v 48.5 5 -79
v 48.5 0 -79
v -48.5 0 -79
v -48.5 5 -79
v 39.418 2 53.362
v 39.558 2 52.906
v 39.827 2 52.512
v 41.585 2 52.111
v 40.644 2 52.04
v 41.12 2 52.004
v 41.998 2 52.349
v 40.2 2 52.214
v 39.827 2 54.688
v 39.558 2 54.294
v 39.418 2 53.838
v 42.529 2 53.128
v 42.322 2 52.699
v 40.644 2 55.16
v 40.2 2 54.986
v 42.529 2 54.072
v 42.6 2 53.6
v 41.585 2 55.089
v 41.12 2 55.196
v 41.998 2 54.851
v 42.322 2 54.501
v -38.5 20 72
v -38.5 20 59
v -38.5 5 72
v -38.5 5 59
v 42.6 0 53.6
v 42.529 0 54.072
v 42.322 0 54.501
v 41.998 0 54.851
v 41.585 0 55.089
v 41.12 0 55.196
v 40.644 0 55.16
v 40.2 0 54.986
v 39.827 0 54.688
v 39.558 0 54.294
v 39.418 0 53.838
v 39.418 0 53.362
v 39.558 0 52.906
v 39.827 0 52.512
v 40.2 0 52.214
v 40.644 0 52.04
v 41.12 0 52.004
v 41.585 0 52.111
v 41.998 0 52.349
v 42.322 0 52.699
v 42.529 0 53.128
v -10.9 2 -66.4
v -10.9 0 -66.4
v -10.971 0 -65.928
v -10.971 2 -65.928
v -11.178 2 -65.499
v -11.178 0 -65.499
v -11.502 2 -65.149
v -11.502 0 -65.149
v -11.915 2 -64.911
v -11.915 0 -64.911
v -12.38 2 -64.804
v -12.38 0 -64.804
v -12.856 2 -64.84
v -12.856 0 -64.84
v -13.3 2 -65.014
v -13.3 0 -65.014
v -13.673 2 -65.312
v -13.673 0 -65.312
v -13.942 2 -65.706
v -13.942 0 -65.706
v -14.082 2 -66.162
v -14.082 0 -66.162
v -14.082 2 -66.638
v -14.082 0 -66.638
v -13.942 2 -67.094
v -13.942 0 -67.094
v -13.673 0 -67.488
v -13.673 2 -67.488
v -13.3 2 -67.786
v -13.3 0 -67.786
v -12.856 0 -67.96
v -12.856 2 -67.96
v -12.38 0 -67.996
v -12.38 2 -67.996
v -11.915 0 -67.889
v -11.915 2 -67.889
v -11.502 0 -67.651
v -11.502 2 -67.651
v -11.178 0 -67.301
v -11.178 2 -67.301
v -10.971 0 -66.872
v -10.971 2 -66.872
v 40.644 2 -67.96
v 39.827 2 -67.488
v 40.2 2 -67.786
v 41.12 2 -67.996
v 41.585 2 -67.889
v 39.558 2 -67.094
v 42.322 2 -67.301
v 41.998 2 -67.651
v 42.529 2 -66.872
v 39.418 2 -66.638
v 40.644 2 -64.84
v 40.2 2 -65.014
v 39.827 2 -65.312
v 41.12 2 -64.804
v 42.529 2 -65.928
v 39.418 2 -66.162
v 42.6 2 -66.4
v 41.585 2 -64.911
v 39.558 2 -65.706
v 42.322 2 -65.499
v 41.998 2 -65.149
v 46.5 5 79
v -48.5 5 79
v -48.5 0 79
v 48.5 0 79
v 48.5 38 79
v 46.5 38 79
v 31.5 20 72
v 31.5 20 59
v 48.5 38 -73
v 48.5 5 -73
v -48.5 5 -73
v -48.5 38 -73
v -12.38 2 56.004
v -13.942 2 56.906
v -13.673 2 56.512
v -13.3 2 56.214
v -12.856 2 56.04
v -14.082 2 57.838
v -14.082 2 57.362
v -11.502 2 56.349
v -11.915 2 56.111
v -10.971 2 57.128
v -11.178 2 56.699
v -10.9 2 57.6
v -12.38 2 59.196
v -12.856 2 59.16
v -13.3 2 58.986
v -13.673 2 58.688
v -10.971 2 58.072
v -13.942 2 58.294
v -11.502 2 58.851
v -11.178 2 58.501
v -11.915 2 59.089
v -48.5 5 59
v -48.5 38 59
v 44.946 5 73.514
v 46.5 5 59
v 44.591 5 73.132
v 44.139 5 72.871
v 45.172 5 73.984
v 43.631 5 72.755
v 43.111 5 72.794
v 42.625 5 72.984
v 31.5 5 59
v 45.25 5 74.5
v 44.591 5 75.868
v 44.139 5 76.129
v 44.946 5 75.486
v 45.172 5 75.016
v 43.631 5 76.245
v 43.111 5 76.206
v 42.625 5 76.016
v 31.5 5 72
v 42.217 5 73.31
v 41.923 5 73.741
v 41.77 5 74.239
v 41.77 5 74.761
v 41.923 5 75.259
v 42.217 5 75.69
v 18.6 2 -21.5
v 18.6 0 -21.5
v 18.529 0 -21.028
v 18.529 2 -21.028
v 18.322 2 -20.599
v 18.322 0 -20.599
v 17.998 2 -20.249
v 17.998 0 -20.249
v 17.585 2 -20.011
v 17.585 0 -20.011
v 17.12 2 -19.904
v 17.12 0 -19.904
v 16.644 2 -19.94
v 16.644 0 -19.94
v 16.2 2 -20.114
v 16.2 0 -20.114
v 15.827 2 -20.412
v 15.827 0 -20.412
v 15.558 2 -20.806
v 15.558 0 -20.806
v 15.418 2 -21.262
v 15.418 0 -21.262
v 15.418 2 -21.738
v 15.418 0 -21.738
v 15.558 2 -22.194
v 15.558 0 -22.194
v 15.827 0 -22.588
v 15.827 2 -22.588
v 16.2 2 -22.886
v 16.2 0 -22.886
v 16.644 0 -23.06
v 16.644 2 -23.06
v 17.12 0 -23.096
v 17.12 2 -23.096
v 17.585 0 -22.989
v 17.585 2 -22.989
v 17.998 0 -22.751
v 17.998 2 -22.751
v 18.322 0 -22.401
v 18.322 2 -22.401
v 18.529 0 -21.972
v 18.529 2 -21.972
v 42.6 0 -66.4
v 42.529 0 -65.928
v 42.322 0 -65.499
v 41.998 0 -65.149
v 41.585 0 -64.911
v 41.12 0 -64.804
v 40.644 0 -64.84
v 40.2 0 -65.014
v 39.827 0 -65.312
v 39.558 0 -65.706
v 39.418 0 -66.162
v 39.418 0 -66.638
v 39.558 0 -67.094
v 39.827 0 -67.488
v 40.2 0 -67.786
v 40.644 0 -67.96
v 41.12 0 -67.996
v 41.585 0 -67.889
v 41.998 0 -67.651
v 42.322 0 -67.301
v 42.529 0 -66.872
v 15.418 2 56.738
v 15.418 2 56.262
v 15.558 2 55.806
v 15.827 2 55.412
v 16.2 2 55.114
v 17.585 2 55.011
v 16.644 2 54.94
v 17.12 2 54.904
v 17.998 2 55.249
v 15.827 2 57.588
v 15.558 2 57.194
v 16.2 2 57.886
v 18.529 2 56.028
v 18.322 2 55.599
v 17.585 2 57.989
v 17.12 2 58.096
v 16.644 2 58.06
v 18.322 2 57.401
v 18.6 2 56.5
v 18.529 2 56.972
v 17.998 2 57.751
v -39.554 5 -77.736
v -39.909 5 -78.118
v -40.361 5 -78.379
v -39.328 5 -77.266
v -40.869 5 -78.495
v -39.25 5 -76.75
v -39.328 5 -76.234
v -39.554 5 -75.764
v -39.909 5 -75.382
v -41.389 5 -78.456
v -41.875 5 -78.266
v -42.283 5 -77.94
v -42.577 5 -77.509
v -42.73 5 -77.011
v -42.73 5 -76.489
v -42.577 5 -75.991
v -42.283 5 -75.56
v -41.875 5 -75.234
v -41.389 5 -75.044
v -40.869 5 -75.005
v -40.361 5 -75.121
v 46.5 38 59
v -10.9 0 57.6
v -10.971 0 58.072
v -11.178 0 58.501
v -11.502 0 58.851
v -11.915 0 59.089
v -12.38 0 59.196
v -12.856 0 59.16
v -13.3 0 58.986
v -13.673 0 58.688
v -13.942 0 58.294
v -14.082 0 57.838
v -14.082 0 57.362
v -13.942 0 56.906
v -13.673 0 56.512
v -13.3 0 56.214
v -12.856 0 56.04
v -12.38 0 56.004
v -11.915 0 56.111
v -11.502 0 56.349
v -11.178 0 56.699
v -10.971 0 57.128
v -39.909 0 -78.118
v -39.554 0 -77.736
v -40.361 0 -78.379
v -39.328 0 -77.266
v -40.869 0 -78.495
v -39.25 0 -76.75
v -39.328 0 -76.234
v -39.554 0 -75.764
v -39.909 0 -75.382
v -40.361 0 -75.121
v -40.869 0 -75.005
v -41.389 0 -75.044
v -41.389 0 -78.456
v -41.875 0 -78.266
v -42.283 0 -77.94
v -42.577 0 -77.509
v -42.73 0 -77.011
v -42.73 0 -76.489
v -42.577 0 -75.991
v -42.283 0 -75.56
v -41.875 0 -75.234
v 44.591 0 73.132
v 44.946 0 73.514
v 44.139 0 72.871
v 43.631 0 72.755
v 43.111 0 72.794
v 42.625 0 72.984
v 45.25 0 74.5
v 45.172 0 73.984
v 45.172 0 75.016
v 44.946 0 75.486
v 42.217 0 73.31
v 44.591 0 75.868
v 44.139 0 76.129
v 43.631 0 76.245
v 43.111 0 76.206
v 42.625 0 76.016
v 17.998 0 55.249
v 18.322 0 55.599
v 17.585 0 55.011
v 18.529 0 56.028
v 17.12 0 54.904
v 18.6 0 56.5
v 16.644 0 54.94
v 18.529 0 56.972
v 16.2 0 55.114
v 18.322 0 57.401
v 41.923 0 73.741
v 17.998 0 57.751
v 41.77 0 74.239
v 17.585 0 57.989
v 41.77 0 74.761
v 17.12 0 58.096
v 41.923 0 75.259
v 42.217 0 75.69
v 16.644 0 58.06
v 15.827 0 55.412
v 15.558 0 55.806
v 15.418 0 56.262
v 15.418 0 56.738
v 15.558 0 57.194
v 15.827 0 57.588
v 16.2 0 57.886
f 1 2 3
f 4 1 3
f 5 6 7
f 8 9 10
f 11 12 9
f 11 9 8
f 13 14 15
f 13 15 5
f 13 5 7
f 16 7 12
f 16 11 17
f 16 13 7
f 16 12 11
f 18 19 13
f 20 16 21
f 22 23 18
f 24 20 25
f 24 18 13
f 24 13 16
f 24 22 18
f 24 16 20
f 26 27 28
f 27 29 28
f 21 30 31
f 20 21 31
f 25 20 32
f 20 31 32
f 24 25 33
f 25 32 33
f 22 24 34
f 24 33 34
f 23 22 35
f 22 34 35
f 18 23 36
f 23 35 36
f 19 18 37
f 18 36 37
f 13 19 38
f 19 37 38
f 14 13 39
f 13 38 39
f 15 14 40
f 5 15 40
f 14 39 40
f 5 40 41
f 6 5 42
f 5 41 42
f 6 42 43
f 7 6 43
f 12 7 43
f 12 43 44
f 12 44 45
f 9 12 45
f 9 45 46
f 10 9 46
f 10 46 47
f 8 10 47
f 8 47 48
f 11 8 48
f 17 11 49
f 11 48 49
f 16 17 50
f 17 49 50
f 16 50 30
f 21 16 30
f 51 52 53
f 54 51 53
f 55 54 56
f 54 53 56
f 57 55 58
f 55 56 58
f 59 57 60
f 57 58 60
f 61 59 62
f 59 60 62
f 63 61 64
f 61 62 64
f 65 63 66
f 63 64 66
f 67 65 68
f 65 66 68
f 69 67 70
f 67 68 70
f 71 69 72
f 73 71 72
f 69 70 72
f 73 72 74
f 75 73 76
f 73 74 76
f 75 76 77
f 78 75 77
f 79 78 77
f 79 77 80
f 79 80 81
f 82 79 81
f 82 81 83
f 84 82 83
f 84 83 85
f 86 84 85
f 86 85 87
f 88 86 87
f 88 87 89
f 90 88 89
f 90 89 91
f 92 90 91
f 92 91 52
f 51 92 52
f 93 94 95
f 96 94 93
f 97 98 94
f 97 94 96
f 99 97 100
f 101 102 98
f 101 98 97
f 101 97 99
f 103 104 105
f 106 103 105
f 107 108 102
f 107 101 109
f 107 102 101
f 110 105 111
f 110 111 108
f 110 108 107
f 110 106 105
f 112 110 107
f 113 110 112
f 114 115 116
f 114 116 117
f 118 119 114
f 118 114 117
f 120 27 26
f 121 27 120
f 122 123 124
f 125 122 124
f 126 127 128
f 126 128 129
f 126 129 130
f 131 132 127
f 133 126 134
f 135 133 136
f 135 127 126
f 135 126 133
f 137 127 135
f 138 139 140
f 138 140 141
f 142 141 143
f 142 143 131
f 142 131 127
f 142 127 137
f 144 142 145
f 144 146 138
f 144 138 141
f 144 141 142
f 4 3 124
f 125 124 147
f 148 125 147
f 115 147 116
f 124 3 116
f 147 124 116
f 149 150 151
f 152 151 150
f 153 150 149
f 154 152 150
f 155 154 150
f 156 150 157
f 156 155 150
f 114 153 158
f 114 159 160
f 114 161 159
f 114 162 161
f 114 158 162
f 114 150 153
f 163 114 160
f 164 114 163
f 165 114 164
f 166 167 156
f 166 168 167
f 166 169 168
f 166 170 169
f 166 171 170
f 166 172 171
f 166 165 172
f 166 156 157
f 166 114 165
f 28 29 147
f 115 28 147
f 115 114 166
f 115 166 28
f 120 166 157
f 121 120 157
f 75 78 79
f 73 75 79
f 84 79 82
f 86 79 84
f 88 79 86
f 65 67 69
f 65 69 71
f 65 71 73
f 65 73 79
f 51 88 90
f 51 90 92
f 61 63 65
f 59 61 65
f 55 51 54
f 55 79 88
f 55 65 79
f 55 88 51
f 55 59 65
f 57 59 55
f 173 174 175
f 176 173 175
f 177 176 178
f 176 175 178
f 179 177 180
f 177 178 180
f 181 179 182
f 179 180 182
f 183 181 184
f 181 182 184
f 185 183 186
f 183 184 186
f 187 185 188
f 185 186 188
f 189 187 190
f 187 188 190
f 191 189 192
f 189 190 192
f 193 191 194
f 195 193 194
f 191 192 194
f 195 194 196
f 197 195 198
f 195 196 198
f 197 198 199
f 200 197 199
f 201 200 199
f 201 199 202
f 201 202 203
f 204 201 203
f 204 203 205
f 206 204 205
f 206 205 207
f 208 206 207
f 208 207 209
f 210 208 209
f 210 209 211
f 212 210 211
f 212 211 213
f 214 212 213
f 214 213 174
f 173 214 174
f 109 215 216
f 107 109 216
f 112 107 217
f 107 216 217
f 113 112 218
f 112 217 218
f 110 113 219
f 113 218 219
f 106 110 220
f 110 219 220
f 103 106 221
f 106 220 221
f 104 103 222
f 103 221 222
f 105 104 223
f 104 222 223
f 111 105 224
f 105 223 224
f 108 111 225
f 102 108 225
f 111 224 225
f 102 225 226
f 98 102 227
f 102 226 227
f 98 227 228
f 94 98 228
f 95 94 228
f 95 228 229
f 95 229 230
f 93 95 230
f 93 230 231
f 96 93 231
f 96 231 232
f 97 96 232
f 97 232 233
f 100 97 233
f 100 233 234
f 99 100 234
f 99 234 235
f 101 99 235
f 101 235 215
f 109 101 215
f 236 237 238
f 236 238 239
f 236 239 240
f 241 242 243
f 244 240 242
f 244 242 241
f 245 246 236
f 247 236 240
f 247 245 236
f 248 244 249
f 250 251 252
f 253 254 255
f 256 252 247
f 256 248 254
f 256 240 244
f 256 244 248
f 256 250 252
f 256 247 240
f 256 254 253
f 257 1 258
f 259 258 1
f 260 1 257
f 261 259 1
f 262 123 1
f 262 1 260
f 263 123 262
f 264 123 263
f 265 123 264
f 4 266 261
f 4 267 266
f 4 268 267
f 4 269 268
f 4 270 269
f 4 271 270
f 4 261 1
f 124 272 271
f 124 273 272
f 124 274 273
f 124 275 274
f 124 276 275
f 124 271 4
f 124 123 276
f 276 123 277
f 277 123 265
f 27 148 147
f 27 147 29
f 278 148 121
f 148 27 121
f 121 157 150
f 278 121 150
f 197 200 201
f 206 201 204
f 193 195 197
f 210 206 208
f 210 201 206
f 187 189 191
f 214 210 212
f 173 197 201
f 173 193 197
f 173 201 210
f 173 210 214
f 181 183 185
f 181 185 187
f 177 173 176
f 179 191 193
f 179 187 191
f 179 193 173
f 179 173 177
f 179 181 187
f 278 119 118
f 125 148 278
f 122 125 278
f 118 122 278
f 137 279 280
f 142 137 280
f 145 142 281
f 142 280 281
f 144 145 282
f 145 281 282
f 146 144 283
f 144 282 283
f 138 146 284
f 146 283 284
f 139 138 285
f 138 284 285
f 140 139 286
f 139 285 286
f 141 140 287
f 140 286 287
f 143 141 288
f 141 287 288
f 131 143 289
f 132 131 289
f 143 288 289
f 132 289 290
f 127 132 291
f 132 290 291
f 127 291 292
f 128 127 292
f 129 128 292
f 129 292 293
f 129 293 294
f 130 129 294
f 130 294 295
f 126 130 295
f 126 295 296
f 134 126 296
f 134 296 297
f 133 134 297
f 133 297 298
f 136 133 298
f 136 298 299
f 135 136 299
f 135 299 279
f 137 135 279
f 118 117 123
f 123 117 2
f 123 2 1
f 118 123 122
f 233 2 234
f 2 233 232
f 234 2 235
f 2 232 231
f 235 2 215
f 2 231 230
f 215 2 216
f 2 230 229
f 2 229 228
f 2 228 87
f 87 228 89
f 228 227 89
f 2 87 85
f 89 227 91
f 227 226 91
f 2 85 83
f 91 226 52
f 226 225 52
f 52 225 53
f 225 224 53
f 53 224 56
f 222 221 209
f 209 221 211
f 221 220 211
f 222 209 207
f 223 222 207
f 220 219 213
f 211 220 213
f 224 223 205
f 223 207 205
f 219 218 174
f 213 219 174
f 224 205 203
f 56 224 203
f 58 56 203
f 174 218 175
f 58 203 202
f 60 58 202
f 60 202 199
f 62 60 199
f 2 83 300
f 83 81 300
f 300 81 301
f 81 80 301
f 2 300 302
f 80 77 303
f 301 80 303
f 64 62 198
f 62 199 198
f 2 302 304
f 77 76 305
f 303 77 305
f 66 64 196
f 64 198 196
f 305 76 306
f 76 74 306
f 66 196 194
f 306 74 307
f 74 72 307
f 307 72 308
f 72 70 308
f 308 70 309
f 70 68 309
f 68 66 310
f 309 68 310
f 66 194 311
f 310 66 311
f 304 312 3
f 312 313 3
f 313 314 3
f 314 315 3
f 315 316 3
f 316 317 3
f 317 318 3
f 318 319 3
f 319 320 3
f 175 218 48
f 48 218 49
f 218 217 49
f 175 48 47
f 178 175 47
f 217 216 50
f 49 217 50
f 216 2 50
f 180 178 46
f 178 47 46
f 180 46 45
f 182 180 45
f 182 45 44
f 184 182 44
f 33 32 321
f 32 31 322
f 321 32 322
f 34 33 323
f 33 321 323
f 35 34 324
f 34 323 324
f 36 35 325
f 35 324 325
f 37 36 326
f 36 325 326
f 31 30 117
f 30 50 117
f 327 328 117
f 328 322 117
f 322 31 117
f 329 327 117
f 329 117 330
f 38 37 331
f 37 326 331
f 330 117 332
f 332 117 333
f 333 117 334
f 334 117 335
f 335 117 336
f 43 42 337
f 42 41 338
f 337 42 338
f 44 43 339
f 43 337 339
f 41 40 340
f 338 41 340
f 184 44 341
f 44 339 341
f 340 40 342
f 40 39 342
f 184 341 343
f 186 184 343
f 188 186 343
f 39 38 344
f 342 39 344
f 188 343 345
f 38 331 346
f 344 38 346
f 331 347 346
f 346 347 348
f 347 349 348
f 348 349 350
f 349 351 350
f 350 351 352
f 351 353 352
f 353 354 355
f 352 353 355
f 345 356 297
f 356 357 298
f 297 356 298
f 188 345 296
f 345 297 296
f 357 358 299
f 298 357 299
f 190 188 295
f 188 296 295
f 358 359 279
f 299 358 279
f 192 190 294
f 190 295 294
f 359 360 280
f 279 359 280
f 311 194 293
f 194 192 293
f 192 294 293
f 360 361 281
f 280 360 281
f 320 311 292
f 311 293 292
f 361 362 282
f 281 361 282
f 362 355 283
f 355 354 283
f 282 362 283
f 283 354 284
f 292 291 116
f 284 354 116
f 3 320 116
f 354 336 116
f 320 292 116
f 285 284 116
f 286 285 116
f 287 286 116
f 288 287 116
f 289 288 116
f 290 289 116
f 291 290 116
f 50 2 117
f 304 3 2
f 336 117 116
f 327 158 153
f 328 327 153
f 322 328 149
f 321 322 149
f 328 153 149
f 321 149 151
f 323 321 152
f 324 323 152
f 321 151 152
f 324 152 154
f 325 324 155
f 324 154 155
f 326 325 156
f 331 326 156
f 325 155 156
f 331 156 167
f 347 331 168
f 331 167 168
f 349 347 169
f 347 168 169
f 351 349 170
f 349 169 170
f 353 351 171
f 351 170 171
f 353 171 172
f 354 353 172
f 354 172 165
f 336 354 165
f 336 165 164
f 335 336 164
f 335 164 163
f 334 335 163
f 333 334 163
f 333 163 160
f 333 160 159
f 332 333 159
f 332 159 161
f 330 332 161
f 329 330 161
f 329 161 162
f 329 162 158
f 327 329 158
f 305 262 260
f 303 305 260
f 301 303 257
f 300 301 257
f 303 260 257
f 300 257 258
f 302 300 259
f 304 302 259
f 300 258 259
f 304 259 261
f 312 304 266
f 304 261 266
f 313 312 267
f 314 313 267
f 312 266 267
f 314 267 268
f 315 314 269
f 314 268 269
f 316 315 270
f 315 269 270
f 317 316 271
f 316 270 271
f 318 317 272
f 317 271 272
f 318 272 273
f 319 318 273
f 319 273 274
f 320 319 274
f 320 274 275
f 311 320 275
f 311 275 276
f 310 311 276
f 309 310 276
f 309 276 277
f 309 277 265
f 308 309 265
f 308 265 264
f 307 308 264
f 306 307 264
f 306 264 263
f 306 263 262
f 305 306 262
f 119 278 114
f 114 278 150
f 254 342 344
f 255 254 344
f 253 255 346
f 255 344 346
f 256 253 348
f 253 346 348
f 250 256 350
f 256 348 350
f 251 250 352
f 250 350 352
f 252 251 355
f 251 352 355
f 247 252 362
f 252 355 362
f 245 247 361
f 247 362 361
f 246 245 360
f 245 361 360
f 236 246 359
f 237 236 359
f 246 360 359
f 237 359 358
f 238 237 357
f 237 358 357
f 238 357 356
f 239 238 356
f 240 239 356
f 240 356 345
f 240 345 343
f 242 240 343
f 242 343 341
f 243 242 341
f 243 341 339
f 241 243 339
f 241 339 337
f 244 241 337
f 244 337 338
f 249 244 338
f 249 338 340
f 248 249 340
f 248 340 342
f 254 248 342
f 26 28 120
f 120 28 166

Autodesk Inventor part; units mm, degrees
ref_plane "YZ Plane" through (0, 0, 0) normal (1, 0, 0) x (0, 1, 0)
ref_plane "XZ Plane" through (0, 0, 0) normal (0, 1, 0) x (-1, 0, 0)
ref_plane "XY Plane" through (0, 0, 0) normal (0, 0, 1) x (1, 0, 0)
sketch "Sketch1" plane through (0, 0, 0) normal (0, 1, 0) x (-1, 0, 0)
  line L0 (-48.5, -79) -> (48.5, -79)
  line L1 (48.5, -79) -> (48.5, 79)
  line L2 (48.5, 79) -> (-48.5, 79)
  line L3 (-48.5, 79) -> (-48.5, -79)
  line L4 (-48.5, -79) -> (48.5, 79) construction
  line L5 (48.5, -79) -> (-48.5, 79) construction
  point P0 (0, 0)
  dimension "d0" = 97
  dimension "d1" = 158
extrude "Extrusion1" add sketch "Sketch1" along normal blind 5
sketch "Sketch2" plane through (0, 5, 0) normal (0, 1, 0) x (1, 0, 0)
  circle A0 centre (-41, 76.75) radius 1.75
  line L0 (-48.5, -79) -> (48.5, -79) projected
  line L1 (48.5, -79) -> (48.5, 79) projected
  circle A1 centre (43.5, -74.5) radius 1.75
  point P0 (0, 0)
  dimension "d4" = 3.5
  dimension "d5" = 155.75
  dimension "d6" = 89.5
  dimension "d7" = 3.5
  dimension "d8" = 4.5
  dimension "d9" = 5
extrude "Extrusion2" cut sketch "Sketch2" against normal blind 5
sketch "Sketch3" plane through (0, 5, 0) normal (0, 1, 0) x (1, 0, 0)
  line L0 (48.5, -79) -> (48.5, 79) projected
  line L1 (-48.5, 79) -> (-48.5, -79) projected
  line L2 (48.5, 73) -> (-48.5, 73)
  line L3 (-48.5, 73) -> (-48.5, -59)
  line L4 (-48.5, -59) -> (48.5, -59)
  line L5 (48.5, -59) -> (48.5, 73)
  line L6 (48.5, 79) -> (-48.5, 79) projected
  line L7 (-48.5, -79) -> (48.5, -79) projected
  point P0 (0, 0)
  dimension "d12" = 6
  dimension "d13" = 20
extrude "Extrusion3" add sketch "Sketch3" along normal blind 33 contours L4 L1 L2 L0
sketch "Sketch4" plane through (-48.5, 5, 59) normal (0, 0, 1) x (1, 0, 0)
  line L0 (0, 33) -> (97, 33) projected
  line L1 (97, 0) -> (0, 0) projected
  line L2 (97, 33) -> (95, 33)
  line L3 (95, 33) -> (95, 0)
  line L4 (95, 0) -> (97, 0)
  line L5 (97, 0) -> (97, 33)
  point P0 (48.5, -5)
  dimension "d16" = 2
extrude "Extrusion4" add sketch "Sketch4" along normal blind 20
sketch "Sketch5" plane through (0, 5, 0) normal (0, 1, 0) x (1, 0, 0)
  line L0 (31.5, -59) -> (-38.5, -59)
  line L1 (-38.5, -59) -> (-38.5, -72)
  line L2 (-38.5, -72) -> (31.5, -72)
  line L3 (31.5, -72) -> (31.5, -59)
  line L4 (-48.5, -59) -> (-48.5, -79) projected
  line L5 (46.5, -59) -> (-48.5, -59) projected
  line L6 (-48.5, -79) -> (46.5, -79) projected
  point P0 (0, 0)
  dimension "d19" = 70
  dimension "d20" = 10
  dimension "d21" = 7
extrude "Extrusion5" add sketch "Sketch5" along normal blind 15
sketch "Sketch6" plane through (0, 0, 0) normal (0, -1, 0) x (1, 0, 0)
  circle A0 centre (41, 53.6) radius 1.6
  circle A1 centre (17, 56.5) radius 1.6
  circle A2 centre (-12.5, 57.6) radius 1.6
  circle A3 centre (41, -66.4) radius 1.6
  circle A4 centre (-12.5, -66.4) radius 1.6
  line L0 (48.5, 79) -> (48.5, -79) projected
  line L1 (-48.5, 79) -> (48.5, 79) projected
  circle A5 centre (17, -21.5) radius 1.6
  point P0 (0, 0)
  dimension "d24" = 3.2
  dimension "d25" = 3.2
  dimension "d26" = 3.2
  dimension "d27" = 3.2
  dimension "d28" = 3.2
  dimension "d29" = 7.5
  dimension "d30" = 25.4
  dimension "d31" = 22.5
  dimension "d32" = 31.5
  dimension "d33" = 61
  dimension "d34" = 21.4
  dimension "d35" = 120
  dimension "d36" = 3.2
  dimension "d37" = 78
extrude "Extrusion6" cut sketch "Sketch6" against normal blind 2
properties part number "source"
